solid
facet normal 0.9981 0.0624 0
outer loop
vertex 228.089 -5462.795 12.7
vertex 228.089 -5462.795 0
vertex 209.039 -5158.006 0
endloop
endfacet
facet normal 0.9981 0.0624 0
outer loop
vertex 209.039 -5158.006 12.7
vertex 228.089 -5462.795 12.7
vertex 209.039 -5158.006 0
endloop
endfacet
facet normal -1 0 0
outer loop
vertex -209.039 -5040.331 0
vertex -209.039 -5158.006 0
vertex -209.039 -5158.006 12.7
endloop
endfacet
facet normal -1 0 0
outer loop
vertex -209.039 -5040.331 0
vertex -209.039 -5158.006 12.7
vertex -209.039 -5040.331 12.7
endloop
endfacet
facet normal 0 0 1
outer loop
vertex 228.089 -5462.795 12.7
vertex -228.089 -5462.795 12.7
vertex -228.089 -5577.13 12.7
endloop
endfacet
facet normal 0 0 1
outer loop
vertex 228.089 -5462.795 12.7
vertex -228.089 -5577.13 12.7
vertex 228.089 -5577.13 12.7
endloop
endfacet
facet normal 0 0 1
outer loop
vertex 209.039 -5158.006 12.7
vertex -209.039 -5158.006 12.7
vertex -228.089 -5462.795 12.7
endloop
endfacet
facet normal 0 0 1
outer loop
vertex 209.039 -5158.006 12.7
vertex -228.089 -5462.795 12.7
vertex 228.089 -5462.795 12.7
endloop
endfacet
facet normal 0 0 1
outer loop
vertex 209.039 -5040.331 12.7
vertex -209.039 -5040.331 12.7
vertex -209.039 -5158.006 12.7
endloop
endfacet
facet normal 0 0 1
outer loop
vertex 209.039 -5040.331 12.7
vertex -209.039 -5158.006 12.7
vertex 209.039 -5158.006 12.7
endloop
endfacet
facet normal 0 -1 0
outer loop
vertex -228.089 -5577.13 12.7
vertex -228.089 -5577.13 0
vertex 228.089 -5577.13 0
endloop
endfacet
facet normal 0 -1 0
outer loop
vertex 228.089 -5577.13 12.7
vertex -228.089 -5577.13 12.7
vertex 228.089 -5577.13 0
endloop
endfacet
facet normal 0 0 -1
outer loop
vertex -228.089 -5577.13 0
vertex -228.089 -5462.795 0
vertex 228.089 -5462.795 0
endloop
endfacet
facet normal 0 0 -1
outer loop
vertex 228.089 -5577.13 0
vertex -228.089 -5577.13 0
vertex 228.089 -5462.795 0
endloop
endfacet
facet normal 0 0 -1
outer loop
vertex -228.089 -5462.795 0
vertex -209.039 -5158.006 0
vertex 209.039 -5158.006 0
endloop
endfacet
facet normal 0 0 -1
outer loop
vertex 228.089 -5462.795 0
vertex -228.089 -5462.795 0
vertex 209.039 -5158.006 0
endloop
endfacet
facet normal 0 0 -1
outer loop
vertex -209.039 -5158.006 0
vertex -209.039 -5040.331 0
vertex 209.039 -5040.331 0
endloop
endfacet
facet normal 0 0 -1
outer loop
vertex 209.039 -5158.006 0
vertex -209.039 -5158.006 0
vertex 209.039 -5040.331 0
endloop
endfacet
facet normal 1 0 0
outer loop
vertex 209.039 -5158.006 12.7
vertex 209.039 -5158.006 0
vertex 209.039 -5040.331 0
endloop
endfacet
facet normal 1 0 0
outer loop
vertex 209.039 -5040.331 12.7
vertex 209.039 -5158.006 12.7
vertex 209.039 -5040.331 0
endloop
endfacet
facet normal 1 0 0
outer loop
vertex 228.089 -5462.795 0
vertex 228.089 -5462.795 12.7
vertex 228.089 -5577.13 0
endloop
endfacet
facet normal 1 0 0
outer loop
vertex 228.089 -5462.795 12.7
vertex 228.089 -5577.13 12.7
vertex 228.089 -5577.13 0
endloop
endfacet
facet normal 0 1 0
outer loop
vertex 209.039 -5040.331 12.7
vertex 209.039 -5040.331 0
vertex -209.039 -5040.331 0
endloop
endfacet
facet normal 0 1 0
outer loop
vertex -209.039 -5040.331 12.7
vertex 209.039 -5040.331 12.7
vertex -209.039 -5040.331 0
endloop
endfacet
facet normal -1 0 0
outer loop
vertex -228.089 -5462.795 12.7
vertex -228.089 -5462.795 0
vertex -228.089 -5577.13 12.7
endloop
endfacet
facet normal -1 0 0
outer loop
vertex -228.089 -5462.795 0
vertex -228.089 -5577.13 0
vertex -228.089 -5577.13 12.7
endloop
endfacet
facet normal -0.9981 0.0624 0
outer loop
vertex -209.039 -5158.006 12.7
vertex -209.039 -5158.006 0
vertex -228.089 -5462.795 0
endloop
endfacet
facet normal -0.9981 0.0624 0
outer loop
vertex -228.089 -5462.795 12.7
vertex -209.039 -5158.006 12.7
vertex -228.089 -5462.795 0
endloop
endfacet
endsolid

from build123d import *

# Parameters (mm, degrees)
SKETCH1_W           = 418.07892
SKETCH1_H           = 415.925
BOSS_EXTRUDE1_DEPTH = 12.7
SKETCH2_W           = 418.07892
SKETCH2_H           = 107.95
BOSS_EXTRUDE2_DEPTH = 12.7
SKETCH3_W           = 418.07892
SKETCH3_H           = 12.923123126
BOSS_EXTRUDE3_DEPTH = 12.7
BOSS_EXTRUDE4_DEPTH = 12.7
CHAMFER1_SIZE       = 304.8
CHAMFER1_SIZE_2     = 19.05


with BuildPart() as part:
    # Sketch1 → Boss-Extrude1 (new body)
    with BuildSketch(Plane.XY):
        with Locations((0, -5261.217030575)):
            Rectangle(SKETCH1_W, SKETCH1_H)
    extrude(amount=BOSS_EXTRUDE1_DEPTH)

    # Sketch2 → Boss-Extrude2 (add, through all)
    with BuildSketch(Plane(origin=(0, 0, 0), x_dir=(-1, 0, 0), z_dir=(0, 0, -1))):
        with Locations((0, -5523.154530575)):
            Rectangle(SKETCH2_W, SKETCH2_H)
    extrude(amount=-BOSS_EXTRUDE2_DEPTH)

    # Sketch3 → Boss-Extrude3 (add, through all)
    with BuildSketch(Plane(origin=(0, 0, 0), x_dir=(-1, 0, 0), z_dir=(0, 0, -1))):
        with Locations((0, -5046.792969012)):
            Rectangle(SKETCH3_W, SKETCH3_H)
    extrude(amount=-BOSS_EXTRUDE3_DEPTH)

    # Sketch4 → Boss-Extrude4 (add, through all)
    with BuildSketch(Plane(origin=(0, 0, 0), x_dir=(-1, 0, 0), z_dir=(0, 0, -1))):
        Polygon((209.038766336, -5462.805770365), (228.088766336, -5462.805770365), (228.088766336, -5577.129530575), (209.03946, -5577.129530575), align=None)
        Polygon((-209.03946, -5577.129530575), (-209.038766336, -5462.805770365), (-228.088766336, -5462.805770365), (-228.088766336, -5577.129530575), align=None)
    extrude(amount=-BOSS_EXTRUDE4_DEPTH)

    # Chamfer1
    # the kernel refuses this chamfer: 304.8, 19.05 mm, written as the material it adds along each edge
    with BuildSketch(Plane(origin=(-209.03946, -5462.805770365, 0), x_dir=(0.002399337658707147, 0.9999971215852571, 0), z_dir=(0, 0, 1))) as chamfer1_piece_1_section:
        Polygon((CHAMFER1_SIZE * 0.999997121585, CHAMFER1_SIZE * 0.00239933765871), (-CHAMFER1_SIZE_2 * 0.00239933765871, CHAMFER1_SIZE_2 * 0.999997121585), (0, 0), align=None)
    chamfer1_piece_1 = extrude(amount=12.7, mode=Mode.PRIVATE)
    chamfer1_piece_1 = split(chamfer1_piece_1, bisect_by=Plane(origin=(-228.088766336, -5341.135021574, 6.35), z_dir=(1, 0, 0)), keep=Keep.TOP, mode=Mode.PRIVATE)
    add(chamfer1_piece_1)
    with BuildSketch(Plane(origin=(209.03946, -5462.805770365, 0), x_dir=(0.8520963193143735, -0.5233850041899339, 0), z_dir=(0, 0, 1))) as chamfer1_piece_2_section:
        Polygon((CHAMFER1_SIZE_2 * 0.852096319314, CHAMFER1_SIZE_2 * 0.52338500419), (-CHAMFER1_SIZE * 0.52338500419, CHAMFER1_SIZE * 0.852096319314), (0, 0), align=None)
    chamfer1_piece_2 = extrude(amount=12.7, mode=Mode.PRIVATE)
    chamfer1_piece_2 = split(chamfer1_piece_2, bisect_by=Plane(origin=(228.088766336, -5341.135021574, 6.35), z_dir=(-1, 0, 0)), keep=Keep.TOP, mode=Mode.PRIVATE)
    add(chamfer1_piece_2)


solid = part.part
